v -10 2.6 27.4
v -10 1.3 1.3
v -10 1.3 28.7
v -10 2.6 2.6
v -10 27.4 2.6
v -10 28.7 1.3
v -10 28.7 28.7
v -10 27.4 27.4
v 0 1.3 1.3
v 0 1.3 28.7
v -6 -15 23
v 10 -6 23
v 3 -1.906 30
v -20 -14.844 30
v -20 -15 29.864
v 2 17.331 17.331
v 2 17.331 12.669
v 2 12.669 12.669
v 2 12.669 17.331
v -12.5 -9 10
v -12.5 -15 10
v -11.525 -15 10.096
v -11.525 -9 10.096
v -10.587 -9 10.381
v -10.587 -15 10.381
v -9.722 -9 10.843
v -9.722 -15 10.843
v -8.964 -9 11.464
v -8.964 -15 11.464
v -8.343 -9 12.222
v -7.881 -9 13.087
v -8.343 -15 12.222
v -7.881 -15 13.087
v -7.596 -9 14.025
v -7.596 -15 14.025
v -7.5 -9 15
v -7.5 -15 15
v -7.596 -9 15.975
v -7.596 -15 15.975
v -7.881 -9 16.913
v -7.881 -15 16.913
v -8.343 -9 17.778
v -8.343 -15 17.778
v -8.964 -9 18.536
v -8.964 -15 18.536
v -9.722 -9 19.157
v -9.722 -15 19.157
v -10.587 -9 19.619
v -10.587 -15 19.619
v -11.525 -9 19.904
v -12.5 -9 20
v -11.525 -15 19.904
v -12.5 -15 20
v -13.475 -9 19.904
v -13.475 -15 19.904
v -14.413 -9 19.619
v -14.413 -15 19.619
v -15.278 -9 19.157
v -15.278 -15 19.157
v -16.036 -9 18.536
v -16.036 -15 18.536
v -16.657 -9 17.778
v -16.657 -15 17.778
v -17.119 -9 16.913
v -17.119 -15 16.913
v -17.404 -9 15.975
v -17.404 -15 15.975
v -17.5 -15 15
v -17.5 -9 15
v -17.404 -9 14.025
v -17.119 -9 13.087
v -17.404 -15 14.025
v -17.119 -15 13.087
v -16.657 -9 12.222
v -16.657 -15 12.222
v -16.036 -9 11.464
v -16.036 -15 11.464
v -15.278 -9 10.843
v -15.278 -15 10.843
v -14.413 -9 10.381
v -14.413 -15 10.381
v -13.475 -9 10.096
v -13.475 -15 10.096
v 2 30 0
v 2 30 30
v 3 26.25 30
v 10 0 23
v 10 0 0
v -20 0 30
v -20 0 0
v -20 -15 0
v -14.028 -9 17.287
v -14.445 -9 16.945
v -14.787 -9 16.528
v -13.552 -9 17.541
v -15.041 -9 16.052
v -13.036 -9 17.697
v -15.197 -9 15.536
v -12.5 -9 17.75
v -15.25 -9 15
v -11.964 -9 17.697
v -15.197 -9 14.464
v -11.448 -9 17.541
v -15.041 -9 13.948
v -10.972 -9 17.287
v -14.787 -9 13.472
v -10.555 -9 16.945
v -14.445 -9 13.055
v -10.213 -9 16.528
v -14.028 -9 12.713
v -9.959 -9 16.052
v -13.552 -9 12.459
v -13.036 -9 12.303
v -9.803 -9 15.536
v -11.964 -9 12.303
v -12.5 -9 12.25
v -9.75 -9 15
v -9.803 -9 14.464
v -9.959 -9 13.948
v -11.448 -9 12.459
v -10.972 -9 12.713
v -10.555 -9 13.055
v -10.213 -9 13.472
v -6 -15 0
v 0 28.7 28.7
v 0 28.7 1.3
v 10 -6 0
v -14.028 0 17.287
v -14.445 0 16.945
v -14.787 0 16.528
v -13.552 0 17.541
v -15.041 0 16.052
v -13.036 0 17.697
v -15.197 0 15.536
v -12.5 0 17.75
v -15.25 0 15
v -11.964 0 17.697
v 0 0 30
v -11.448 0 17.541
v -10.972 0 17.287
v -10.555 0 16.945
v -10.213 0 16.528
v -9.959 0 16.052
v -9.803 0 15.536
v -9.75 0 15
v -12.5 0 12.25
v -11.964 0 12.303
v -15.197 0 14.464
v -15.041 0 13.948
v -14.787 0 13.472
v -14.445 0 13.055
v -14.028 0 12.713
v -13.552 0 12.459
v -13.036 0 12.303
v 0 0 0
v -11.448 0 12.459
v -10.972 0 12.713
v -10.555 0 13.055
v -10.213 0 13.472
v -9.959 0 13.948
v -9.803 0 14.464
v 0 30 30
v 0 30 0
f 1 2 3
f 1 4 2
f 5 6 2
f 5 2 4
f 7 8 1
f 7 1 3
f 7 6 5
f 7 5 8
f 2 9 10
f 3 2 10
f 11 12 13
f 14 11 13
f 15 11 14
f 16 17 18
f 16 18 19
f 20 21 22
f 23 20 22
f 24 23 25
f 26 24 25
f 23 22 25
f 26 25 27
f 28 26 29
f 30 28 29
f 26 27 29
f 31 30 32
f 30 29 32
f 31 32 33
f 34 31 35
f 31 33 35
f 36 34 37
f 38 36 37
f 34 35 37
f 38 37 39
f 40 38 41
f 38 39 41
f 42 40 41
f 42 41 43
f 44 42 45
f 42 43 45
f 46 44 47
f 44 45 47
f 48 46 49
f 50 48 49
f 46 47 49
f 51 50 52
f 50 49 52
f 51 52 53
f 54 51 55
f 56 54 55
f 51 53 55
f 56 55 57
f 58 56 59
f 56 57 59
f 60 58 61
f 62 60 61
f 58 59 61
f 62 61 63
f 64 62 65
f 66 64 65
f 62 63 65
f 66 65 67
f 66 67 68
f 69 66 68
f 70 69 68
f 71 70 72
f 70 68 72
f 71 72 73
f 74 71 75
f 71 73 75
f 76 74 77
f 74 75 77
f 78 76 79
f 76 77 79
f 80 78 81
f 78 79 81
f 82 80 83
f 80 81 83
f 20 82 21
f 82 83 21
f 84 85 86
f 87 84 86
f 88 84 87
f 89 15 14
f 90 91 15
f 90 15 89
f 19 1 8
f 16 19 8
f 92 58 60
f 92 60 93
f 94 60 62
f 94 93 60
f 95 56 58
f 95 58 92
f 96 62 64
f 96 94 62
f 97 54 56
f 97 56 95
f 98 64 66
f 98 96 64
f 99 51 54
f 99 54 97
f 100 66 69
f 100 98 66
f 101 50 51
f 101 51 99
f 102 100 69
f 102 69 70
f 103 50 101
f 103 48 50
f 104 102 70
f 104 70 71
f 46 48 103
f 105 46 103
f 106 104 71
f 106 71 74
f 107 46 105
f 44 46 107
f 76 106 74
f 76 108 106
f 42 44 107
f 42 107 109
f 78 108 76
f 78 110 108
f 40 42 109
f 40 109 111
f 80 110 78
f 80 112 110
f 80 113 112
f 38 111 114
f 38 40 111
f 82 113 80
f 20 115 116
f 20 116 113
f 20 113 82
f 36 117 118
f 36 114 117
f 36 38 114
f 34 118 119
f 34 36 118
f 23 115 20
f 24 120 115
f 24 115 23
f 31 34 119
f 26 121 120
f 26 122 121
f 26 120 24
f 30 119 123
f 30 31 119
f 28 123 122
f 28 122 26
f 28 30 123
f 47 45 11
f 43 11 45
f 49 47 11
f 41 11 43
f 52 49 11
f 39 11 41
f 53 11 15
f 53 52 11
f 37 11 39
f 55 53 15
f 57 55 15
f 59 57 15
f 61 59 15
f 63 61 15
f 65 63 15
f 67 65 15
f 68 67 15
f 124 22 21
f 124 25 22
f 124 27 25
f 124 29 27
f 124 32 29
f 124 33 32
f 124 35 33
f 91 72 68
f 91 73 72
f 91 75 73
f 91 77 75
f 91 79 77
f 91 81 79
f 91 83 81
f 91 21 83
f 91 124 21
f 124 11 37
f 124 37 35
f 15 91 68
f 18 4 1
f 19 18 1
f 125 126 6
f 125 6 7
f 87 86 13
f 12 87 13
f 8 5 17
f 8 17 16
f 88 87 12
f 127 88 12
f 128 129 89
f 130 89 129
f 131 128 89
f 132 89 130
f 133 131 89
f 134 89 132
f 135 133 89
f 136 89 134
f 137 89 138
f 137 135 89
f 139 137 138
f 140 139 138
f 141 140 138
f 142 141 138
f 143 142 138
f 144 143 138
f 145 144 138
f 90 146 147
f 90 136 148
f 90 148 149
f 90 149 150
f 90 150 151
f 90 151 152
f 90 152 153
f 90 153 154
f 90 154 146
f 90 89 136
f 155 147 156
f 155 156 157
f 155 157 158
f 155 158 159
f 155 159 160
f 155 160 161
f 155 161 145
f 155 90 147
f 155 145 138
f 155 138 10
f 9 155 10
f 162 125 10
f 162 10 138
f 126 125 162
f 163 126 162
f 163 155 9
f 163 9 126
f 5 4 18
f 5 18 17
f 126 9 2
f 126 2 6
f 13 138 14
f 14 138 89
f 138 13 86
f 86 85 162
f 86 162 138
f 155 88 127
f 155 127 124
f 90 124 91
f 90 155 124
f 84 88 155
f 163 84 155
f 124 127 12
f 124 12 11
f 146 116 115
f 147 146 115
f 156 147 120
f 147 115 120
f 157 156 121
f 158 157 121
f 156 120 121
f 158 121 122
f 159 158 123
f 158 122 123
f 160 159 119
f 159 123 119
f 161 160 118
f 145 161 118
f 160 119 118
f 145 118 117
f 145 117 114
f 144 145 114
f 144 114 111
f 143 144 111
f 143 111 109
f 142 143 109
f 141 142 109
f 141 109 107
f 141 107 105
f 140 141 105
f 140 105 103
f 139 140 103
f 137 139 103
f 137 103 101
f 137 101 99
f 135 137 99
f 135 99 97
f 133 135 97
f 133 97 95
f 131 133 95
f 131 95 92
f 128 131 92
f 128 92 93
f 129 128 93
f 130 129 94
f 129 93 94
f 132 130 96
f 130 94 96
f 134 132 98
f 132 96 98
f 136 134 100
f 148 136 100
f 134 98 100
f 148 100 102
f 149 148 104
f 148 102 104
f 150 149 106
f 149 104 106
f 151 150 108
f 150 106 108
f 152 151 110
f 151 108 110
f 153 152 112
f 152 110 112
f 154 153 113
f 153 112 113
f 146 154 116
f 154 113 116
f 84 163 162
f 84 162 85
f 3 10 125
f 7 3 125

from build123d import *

# Parameters (mm, degrees)
RESSALTO_EXTRUS_O1_DEPTH = 30
ESBO_O2_R                = 5
CORTE_EXTRUS_O1_DEPTH    = 6
CHANFRO1_SIZE            = 7
ESBO_O3_R                = 2.75
CORTE_EXTRUS_O2_DEPTH    = 54.1130869
ESBO_O4_W                = 27.4
ESBO_O4_H                = 27.4
RESSALTO_EXTRUS_O2_DEPTH = 10
ESBO_O5_W                = 24.8
ESBO_O5_H                = 24.8
CORTE_EXTRUS_O3_DEPTH    = 12
CORTE_EXTRUS_O3_DRAFT    = -40


with BuildPart() as part:
    # Esboço1 → Ressalto-extrusão1 (new body)
    with BuildSketch(Plane.XY):
        Polygon((0, 0), (0, 30), (2, 30), (10, 0), (10, -6), (-6, -15), (-20, -15), (-20, 0), align=None)
    extrude(amount=RESSALTO_EXTRUS_O1_DEPTH)

    # Esboço2 → Corte-extrusão1 (cut)
    with BuildSketch(Plane.XZ.offset(15)):
        with Locations(Location((-12.5, 15, 0), (0, 0, 270))):
            Circle(ESBO_O2_R)
    extrude(amount=-CORTE_EXTRUS_O1_DEPTH, mode=Mode.SUBTRACT)

    # Chanfro1
    chanfro1_edges = [part.edges().sort_by_distance(p)[0] for p in [
        (2, -10.5, 30),
        (10, -3, 30),
    ]]
    chamfer(chanfro1_edges, length=CHANFRO1_SIZE)

    # Esboço3 → Corte-extrusão2 (cut, through all)
    with BuildSketch(Plane.XZ.offset(9)):
        with Locations(Location((-12.5, 15, 0), (0, 0, 270))):
            Circle(ESBO_O3_R)
    extrude(amount=-CORTE_EXTRUS_O2_DEPTH, mode=Mode.SUBTRACT)

    # Esboço4 → Ressalto-extrusão2 (add)
    with BuildSketch(Plane.ZY):
        with Locations((15, 15)):
            Rectangle(ESBO_O4_W, ESBO_O4_H)
    extrude(amount=RESSALTO_EXTRUS_O2_DEPTH)


with BuildPart() as corte_extrus_o3_tool:
    # Esboço5 → Corte-extrusão3 (with draft: the straight prism first)
    with BuildSketch(Plane.ZY.offset(10)):
        with Locations((15, 15)):
            Rectangle(ESBO_O5_W, ESBO_O5_H)
    extrude(amount=-CORTE_EXTRUS_O3_DEPTH)
    # Corte-extrusão3: the draft: its side faces are tilted about the plane it starts from
    corte_extrus_o3_sides = [corte_extrus_o3_tool.faces().sort_by_distance(p)[0] for p in [
        (-4, 27.4, 15),
        (-4, 15, 2.6),
        (-4, 2.6, 15),
        (-4, 15, 27.4),
    ]]
    draft(corte_extrus_o3_sides, Plane.ZY.offset(10), CORTE_EXTRUS_O3_DRAFT)


with BuildPart() as part_1:
    add(part.part)

    # Corte-extrusão3: cut by corte_extrus_o3_tool
    add(corte_extrus_o3_tool.part, mode=Mode.SUBTRACT)


solid = part_1.part
